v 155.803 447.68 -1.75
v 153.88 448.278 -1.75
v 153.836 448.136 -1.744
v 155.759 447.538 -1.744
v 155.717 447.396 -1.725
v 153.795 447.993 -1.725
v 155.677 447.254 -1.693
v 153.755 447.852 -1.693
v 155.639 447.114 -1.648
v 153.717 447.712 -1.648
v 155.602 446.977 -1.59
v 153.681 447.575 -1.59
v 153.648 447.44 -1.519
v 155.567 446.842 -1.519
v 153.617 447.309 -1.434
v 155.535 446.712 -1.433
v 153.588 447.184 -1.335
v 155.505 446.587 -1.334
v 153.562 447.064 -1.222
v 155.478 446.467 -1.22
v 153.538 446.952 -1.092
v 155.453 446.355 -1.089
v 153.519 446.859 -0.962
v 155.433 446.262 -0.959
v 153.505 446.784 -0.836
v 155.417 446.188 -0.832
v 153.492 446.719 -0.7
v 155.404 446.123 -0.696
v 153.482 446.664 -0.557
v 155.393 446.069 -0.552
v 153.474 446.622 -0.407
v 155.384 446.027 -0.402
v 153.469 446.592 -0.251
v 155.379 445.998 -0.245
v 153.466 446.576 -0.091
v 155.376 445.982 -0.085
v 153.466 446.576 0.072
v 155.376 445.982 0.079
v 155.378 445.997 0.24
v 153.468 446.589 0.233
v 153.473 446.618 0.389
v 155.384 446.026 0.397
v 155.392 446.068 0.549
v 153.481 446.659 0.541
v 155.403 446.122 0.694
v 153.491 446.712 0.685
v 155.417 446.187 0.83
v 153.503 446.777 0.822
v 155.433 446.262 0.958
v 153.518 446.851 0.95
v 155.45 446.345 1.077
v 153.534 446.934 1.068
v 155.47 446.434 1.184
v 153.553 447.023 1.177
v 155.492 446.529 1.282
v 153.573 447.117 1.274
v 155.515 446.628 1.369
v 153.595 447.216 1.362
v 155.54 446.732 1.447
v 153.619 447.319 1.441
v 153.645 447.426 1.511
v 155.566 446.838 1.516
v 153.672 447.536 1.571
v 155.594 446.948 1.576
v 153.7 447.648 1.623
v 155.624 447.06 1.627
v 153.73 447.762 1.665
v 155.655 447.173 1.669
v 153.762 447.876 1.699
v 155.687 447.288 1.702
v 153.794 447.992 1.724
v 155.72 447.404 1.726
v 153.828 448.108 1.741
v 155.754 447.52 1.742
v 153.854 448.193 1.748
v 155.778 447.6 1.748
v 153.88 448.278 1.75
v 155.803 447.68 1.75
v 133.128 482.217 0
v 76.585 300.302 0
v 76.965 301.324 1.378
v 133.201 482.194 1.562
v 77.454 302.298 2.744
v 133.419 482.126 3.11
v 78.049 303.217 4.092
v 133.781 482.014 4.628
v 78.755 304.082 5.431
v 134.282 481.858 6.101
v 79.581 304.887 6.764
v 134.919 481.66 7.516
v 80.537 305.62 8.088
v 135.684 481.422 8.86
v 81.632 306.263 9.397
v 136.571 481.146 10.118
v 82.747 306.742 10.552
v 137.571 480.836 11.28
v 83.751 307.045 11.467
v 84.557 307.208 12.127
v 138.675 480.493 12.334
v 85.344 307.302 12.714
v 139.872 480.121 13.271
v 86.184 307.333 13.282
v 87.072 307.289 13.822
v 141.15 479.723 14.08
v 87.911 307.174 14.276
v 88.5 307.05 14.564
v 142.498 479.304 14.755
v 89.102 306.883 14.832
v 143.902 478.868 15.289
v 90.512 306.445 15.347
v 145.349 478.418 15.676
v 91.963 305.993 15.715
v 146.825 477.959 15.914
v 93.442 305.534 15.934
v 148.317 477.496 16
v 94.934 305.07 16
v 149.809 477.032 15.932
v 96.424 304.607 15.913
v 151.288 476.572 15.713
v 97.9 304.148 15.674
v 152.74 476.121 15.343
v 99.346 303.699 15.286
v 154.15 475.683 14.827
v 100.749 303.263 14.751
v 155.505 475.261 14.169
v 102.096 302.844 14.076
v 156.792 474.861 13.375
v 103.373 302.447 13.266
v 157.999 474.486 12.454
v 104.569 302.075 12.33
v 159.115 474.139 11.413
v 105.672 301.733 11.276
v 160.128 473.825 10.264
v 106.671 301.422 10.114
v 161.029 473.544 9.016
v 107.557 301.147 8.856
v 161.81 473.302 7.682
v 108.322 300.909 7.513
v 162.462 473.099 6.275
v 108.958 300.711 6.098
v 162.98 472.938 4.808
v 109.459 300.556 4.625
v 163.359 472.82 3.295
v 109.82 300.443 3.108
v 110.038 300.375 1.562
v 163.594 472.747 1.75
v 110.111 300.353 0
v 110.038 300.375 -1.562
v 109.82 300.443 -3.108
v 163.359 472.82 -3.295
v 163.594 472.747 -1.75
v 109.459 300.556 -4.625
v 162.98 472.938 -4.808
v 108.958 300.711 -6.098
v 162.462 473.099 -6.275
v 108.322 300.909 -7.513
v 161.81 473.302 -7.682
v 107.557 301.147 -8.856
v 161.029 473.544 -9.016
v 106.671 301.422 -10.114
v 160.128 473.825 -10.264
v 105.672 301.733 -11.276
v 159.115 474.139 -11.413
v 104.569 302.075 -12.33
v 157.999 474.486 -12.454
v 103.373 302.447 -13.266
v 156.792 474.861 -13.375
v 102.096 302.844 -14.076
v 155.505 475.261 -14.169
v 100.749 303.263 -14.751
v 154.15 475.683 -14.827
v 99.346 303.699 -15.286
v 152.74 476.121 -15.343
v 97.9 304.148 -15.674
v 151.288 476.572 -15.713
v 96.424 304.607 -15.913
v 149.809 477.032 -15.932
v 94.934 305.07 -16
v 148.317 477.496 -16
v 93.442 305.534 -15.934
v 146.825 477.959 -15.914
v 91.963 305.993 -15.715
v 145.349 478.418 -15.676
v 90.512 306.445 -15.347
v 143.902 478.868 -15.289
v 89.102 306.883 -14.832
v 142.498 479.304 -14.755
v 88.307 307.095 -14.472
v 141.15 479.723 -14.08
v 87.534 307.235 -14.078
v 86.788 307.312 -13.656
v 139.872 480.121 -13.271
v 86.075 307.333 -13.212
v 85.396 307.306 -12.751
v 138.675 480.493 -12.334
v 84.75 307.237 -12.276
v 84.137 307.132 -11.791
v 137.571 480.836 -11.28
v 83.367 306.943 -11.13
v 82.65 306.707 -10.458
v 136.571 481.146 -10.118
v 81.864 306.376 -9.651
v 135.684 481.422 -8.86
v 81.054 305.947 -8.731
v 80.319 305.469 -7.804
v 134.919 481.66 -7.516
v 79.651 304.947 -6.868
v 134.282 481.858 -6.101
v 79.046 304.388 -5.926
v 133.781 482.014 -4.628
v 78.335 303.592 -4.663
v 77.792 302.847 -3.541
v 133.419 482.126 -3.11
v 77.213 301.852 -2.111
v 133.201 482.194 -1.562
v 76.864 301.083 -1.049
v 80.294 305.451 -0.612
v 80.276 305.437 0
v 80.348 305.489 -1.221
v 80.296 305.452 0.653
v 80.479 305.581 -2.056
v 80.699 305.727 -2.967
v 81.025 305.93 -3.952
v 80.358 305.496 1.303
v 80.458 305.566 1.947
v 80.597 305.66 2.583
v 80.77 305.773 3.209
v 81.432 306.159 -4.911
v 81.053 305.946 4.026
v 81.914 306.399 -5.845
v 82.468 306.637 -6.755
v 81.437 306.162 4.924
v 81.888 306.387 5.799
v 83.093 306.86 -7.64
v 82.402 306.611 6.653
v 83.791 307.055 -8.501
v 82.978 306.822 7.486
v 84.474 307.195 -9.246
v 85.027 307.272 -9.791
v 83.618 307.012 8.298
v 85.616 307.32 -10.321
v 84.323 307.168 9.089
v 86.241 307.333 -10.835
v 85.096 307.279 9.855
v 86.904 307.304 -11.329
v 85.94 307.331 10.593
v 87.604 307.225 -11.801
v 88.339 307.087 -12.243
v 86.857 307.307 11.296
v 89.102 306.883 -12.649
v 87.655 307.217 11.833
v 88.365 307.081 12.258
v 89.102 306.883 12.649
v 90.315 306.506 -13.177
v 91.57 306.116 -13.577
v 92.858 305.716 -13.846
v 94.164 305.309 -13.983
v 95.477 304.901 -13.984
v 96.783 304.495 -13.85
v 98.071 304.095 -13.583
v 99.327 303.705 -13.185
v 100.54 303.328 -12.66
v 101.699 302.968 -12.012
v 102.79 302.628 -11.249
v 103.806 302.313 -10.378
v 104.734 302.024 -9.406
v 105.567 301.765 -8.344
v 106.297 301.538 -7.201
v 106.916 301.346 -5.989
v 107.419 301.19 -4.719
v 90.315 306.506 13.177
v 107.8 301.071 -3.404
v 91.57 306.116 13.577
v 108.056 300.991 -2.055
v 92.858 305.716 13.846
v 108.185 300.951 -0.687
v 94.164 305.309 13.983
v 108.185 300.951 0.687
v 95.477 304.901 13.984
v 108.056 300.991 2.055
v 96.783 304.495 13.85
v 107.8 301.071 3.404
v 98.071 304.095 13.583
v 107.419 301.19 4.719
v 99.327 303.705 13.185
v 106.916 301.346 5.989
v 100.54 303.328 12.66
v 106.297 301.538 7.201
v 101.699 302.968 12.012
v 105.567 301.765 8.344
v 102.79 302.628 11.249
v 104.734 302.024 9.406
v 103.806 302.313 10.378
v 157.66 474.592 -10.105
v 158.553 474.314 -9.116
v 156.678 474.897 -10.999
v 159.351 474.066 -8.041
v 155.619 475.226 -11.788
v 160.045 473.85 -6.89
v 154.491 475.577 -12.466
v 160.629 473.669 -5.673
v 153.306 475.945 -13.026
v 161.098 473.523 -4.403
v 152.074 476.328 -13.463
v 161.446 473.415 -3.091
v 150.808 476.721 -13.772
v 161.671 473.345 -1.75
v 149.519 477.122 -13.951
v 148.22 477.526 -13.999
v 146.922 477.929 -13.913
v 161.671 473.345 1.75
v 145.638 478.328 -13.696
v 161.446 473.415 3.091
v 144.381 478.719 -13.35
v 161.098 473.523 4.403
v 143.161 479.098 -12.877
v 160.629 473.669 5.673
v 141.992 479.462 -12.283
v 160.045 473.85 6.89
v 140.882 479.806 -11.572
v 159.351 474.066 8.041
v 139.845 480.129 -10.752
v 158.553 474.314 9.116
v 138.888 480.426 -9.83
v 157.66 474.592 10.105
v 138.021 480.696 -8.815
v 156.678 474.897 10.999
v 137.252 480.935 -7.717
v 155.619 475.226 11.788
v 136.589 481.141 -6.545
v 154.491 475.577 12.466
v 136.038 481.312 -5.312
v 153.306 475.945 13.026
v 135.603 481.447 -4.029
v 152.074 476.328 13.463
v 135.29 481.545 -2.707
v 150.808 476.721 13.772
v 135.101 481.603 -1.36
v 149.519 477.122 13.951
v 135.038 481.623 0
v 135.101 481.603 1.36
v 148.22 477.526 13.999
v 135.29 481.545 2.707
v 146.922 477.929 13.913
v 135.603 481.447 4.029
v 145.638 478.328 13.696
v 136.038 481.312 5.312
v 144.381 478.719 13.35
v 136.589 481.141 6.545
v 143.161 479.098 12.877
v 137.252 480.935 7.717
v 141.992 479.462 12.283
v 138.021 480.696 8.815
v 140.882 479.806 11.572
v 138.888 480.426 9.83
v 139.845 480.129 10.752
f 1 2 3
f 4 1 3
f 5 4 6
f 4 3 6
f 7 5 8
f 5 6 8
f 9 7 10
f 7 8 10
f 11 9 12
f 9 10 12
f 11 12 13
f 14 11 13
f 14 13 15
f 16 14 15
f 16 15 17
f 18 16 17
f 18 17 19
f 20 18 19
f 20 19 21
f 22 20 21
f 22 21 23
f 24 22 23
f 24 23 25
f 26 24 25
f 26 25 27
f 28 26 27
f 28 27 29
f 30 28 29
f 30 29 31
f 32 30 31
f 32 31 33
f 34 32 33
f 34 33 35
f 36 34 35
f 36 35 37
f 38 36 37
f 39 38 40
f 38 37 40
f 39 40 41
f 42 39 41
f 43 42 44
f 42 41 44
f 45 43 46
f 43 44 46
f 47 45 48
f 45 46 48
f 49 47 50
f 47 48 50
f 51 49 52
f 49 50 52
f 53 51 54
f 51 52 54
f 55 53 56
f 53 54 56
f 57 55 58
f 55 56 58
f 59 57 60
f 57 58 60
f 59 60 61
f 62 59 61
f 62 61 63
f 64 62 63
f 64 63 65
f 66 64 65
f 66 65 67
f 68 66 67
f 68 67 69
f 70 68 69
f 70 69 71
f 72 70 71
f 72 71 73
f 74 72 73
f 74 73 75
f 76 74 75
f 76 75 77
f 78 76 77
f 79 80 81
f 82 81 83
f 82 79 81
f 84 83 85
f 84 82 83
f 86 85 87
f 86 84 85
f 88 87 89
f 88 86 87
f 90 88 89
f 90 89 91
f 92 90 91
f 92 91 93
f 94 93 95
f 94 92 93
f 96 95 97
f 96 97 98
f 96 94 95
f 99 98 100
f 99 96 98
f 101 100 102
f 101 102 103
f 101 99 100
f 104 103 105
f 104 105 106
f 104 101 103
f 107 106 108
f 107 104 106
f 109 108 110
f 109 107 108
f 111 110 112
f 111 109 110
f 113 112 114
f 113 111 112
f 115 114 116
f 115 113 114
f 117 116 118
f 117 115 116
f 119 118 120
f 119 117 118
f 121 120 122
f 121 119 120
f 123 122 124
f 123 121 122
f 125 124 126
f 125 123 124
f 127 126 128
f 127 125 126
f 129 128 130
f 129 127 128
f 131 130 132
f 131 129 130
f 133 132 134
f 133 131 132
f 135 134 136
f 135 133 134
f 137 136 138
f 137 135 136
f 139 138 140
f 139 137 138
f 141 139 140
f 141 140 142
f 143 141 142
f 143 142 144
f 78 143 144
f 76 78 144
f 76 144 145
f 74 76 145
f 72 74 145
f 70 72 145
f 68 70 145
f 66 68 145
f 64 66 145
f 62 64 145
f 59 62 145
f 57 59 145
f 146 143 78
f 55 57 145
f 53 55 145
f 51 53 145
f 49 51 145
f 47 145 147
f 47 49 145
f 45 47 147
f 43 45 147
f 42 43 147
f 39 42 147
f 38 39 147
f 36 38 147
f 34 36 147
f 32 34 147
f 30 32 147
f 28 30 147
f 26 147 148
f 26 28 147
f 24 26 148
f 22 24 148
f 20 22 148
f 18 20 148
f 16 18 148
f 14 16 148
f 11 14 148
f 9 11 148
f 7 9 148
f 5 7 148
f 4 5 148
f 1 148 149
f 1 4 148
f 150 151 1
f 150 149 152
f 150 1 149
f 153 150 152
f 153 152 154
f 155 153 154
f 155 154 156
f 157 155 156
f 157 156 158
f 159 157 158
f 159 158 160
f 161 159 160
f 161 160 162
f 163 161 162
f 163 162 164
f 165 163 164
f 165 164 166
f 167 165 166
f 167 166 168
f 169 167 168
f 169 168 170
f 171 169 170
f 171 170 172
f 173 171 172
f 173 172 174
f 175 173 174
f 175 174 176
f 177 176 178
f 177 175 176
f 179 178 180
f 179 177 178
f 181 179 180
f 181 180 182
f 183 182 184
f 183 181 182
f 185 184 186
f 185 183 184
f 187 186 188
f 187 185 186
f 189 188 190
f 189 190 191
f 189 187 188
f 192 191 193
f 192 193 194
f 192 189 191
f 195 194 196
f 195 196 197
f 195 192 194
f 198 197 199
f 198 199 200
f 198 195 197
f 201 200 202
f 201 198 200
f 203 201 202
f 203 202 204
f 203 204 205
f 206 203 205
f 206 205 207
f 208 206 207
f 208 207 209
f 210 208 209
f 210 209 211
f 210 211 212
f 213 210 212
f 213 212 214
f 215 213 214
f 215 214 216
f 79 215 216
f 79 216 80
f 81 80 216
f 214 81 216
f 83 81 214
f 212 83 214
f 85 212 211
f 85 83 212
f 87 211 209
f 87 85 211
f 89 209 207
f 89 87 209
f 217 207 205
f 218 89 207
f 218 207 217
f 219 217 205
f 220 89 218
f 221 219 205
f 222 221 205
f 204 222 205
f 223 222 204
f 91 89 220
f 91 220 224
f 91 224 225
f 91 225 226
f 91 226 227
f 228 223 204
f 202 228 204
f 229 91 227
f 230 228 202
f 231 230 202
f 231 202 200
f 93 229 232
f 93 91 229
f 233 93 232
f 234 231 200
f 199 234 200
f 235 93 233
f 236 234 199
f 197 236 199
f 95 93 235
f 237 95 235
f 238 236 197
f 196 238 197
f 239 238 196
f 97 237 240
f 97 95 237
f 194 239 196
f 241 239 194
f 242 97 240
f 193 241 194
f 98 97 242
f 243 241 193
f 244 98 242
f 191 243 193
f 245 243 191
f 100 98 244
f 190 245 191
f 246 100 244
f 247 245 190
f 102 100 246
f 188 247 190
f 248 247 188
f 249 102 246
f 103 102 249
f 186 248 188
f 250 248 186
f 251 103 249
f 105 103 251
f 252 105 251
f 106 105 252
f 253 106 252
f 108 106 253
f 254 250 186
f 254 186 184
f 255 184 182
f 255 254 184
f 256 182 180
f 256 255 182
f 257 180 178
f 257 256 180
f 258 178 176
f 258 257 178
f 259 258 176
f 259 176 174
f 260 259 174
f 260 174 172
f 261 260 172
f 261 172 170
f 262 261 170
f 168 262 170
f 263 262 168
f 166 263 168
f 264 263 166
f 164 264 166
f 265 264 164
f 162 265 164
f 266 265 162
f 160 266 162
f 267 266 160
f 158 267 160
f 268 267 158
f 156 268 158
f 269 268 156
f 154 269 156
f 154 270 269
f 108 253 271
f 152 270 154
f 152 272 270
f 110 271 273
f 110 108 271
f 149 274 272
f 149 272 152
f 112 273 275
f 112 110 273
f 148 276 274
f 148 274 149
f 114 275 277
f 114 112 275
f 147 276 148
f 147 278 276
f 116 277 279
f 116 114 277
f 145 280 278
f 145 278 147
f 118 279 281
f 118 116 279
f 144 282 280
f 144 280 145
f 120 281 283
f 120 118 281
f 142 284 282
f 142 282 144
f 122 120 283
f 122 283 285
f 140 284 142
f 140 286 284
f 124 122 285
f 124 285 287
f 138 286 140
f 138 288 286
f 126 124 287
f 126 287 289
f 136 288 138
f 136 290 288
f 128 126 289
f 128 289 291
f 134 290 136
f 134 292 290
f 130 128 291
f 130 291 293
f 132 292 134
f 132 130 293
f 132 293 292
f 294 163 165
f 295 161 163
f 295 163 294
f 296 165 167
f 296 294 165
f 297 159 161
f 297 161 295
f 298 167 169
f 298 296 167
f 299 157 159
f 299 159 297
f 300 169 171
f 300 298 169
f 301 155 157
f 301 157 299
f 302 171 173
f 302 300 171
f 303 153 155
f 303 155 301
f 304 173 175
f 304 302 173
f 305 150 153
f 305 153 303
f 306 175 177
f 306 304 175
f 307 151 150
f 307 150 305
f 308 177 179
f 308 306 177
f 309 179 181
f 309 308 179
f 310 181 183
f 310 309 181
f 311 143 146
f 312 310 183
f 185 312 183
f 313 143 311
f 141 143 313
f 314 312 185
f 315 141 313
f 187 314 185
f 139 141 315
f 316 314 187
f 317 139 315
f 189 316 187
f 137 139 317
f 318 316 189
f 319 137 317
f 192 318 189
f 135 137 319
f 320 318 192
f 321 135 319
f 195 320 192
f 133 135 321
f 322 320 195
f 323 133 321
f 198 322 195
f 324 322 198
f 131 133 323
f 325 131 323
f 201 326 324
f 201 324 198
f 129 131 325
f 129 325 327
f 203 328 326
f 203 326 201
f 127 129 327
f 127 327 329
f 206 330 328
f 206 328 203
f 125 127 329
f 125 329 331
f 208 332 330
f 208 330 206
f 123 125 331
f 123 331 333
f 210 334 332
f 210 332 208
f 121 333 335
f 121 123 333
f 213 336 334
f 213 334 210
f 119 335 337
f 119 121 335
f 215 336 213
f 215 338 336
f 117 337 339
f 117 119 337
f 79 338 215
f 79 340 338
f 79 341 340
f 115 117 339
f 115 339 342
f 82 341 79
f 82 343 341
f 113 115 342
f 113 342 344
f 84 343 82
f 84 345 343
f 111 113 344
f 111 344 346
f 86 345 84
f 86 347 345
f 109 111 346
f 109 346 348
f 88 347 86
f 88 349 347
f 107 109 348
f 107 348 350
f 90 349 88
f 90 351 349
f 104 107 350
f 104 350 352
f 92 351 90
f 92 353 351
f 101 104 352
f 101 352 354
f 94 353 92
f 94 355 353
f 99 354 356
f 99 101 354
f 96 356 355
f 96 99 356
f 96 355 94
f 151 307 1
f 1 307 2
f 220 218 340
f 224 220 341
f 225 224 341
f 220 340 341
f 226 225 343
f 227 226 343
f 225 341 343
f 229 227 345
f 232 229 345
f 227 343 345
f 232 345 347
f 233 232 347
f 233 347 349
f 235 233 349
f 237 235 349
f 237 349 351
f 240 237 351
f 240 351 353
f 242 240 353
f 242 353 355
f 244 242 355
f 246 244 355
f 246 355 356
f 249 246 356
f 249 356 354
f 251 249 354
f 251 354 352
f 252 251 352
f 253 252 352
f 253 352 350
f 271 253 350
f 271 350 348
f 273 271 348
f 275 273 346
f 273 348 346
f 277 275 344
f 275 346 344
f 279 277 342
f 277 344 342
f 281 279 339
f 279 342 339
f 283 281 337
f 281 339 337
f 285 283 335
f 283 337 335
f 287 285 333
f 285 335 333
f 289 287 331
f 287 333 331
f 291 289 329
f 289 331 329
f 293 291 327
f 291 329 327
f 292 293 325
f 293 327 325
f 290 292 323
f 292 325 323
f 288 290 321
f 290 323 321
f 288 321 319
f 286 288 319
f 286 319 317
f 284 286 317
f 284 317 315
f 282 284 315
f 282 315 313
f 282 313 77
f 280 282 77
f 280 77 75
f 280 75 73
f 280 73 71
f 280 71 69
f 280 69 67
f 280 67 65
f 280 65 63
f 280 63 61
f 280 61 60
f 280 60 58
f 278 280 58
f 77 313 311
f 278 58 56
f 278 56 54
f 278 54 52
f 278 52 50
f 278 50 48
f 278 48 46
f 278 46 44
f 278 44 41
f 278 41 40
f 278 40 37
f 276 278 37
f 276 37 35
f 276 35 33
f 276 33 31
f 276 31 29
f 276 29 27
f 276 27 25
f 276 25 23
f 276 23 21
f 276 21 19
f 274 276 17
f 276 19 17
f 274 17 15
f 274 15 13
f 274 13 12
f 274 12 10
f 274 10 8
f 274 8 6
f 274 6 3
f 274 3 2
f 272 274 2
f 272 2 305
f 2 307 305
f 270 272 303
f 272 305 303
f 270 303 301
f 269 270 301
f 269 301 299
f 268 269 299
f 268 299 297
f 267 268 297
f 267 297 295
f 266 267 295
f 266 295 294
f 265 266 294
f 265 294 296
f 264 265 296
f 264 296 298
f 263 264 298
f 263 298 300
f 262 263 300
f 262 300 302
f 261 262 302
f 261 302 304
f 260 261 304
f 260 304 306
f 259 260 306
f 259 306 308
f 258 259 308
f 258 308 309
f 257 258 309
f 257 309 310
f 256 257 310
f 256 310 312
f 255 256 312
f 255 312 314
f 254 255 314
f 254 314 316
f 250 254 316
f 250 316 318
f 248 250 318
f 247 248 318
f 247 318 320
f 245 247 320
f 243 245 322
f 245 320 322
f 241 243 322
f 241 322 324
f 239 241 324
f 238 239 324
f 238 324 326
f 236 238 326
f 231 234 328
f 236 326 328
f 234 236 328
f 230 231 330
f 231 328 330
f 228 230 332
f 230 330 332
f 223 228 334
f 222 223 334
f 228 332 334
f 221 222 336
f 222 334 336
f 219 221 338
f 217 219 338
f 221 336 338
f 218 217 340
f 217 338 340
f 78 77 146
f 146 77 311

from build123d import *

# Parameters (mm, degrees)
ESQUISSE2_R                  = 16
ESQUISSE2_R_2                = 14
EXTRUSION5_DEPTH             = 213
ENL_V_MAT_EXTRU_1_DEPTH      = 17
ENL_V_MAT_EXTRU_1_DEPTH_BACK = 17
ENL_V_MAT_EXTRU_2_DEPTH      = 68.17581801


with BuildPart() as part:
    # Esquisse2 → Extrusion5 (new body)
    with BuildSketch(Plane(origin=(148.407000681, 477.467655605, 0), x_dir=(-0.954935311, 0.296814001, 0), z_dir=(0.296814001, 0.954935311, 0))):
        Circle(ESQUISSE2_R)
        Circle(ESQUISSE2_R_2, mode=Mode.SUBTRACT)
    extrude(amount=-EXTRUSION5_DEPTH)

    # Esquisse12 → Enlèv. mat.-Extru.1 (cut, two sides)
    with BuildSketch(Plane.XY) as enl_v_mat_extru_1_sk:
        with BuildLine():
            Line((67.680548401, 271.653443505), (76.584968442, 300.301502841))
            ThreePointArc((76.584968442, 300.301502841), (81.480701144, 306.1845671), (89.102461568, 306.88271594))
            Line((89.102461568, 306.88271594), (117.750520904, 297.978295899))
            ThreePointArc((117.750520904, 297.978295899), (132.458181552, 285.738964145), (134.20355365, 266.684563085))
            Line((134.20355365, 266.684563085), (125.29913361, 238.036503748))
            ThreePointArc((125.29913361, 238.036503748), (120.403400908, 232.153439489), (112.781640484, 231.45529065))
            Line((112.781640484, 231.45529065), (84.133581147, 240.359710691))
            ThreePointArc((84.133581147, 240.359710691), (69.4259205, 252.599042445), (67.680548401, 271.653443505))
        make_face()
    extrude(amount=ENL_V_MAT_EXTRU_1_DEPTH, mode=Mode.SUBTRACT)
    extrude(enl_v_mat_extru_1_sk.sketch, amount=-ENL_V_MAT_EXTRU_1_DEPTH_BACK, mode=Mode.SUBTRACT)

    # Esquisse13 → Enlèv. mat.-Extru.2 (cut, through all)
    with BuildSketch(Plane(origin=(0, 0, 0), x_dir=(0, 0, -1), z_dir=(0.954935311, -0.296814001, 0))):
        with BuildLine():
            Line((-1.75, 500), (1.75, 500))
            Line((1.75, 500), (1.75, 473.75))
            ThreePointArc((1.75, 473.75), (0, 472), (-1.75, 473.75))
            Line((-1.75, 473.75), (-1.75, 500))
        make_face()
    extrude(amount=ENL_V_MAT_EXTRU_2_DEPTH, mode=Mode.SUBTRACT)


solid = part.part
